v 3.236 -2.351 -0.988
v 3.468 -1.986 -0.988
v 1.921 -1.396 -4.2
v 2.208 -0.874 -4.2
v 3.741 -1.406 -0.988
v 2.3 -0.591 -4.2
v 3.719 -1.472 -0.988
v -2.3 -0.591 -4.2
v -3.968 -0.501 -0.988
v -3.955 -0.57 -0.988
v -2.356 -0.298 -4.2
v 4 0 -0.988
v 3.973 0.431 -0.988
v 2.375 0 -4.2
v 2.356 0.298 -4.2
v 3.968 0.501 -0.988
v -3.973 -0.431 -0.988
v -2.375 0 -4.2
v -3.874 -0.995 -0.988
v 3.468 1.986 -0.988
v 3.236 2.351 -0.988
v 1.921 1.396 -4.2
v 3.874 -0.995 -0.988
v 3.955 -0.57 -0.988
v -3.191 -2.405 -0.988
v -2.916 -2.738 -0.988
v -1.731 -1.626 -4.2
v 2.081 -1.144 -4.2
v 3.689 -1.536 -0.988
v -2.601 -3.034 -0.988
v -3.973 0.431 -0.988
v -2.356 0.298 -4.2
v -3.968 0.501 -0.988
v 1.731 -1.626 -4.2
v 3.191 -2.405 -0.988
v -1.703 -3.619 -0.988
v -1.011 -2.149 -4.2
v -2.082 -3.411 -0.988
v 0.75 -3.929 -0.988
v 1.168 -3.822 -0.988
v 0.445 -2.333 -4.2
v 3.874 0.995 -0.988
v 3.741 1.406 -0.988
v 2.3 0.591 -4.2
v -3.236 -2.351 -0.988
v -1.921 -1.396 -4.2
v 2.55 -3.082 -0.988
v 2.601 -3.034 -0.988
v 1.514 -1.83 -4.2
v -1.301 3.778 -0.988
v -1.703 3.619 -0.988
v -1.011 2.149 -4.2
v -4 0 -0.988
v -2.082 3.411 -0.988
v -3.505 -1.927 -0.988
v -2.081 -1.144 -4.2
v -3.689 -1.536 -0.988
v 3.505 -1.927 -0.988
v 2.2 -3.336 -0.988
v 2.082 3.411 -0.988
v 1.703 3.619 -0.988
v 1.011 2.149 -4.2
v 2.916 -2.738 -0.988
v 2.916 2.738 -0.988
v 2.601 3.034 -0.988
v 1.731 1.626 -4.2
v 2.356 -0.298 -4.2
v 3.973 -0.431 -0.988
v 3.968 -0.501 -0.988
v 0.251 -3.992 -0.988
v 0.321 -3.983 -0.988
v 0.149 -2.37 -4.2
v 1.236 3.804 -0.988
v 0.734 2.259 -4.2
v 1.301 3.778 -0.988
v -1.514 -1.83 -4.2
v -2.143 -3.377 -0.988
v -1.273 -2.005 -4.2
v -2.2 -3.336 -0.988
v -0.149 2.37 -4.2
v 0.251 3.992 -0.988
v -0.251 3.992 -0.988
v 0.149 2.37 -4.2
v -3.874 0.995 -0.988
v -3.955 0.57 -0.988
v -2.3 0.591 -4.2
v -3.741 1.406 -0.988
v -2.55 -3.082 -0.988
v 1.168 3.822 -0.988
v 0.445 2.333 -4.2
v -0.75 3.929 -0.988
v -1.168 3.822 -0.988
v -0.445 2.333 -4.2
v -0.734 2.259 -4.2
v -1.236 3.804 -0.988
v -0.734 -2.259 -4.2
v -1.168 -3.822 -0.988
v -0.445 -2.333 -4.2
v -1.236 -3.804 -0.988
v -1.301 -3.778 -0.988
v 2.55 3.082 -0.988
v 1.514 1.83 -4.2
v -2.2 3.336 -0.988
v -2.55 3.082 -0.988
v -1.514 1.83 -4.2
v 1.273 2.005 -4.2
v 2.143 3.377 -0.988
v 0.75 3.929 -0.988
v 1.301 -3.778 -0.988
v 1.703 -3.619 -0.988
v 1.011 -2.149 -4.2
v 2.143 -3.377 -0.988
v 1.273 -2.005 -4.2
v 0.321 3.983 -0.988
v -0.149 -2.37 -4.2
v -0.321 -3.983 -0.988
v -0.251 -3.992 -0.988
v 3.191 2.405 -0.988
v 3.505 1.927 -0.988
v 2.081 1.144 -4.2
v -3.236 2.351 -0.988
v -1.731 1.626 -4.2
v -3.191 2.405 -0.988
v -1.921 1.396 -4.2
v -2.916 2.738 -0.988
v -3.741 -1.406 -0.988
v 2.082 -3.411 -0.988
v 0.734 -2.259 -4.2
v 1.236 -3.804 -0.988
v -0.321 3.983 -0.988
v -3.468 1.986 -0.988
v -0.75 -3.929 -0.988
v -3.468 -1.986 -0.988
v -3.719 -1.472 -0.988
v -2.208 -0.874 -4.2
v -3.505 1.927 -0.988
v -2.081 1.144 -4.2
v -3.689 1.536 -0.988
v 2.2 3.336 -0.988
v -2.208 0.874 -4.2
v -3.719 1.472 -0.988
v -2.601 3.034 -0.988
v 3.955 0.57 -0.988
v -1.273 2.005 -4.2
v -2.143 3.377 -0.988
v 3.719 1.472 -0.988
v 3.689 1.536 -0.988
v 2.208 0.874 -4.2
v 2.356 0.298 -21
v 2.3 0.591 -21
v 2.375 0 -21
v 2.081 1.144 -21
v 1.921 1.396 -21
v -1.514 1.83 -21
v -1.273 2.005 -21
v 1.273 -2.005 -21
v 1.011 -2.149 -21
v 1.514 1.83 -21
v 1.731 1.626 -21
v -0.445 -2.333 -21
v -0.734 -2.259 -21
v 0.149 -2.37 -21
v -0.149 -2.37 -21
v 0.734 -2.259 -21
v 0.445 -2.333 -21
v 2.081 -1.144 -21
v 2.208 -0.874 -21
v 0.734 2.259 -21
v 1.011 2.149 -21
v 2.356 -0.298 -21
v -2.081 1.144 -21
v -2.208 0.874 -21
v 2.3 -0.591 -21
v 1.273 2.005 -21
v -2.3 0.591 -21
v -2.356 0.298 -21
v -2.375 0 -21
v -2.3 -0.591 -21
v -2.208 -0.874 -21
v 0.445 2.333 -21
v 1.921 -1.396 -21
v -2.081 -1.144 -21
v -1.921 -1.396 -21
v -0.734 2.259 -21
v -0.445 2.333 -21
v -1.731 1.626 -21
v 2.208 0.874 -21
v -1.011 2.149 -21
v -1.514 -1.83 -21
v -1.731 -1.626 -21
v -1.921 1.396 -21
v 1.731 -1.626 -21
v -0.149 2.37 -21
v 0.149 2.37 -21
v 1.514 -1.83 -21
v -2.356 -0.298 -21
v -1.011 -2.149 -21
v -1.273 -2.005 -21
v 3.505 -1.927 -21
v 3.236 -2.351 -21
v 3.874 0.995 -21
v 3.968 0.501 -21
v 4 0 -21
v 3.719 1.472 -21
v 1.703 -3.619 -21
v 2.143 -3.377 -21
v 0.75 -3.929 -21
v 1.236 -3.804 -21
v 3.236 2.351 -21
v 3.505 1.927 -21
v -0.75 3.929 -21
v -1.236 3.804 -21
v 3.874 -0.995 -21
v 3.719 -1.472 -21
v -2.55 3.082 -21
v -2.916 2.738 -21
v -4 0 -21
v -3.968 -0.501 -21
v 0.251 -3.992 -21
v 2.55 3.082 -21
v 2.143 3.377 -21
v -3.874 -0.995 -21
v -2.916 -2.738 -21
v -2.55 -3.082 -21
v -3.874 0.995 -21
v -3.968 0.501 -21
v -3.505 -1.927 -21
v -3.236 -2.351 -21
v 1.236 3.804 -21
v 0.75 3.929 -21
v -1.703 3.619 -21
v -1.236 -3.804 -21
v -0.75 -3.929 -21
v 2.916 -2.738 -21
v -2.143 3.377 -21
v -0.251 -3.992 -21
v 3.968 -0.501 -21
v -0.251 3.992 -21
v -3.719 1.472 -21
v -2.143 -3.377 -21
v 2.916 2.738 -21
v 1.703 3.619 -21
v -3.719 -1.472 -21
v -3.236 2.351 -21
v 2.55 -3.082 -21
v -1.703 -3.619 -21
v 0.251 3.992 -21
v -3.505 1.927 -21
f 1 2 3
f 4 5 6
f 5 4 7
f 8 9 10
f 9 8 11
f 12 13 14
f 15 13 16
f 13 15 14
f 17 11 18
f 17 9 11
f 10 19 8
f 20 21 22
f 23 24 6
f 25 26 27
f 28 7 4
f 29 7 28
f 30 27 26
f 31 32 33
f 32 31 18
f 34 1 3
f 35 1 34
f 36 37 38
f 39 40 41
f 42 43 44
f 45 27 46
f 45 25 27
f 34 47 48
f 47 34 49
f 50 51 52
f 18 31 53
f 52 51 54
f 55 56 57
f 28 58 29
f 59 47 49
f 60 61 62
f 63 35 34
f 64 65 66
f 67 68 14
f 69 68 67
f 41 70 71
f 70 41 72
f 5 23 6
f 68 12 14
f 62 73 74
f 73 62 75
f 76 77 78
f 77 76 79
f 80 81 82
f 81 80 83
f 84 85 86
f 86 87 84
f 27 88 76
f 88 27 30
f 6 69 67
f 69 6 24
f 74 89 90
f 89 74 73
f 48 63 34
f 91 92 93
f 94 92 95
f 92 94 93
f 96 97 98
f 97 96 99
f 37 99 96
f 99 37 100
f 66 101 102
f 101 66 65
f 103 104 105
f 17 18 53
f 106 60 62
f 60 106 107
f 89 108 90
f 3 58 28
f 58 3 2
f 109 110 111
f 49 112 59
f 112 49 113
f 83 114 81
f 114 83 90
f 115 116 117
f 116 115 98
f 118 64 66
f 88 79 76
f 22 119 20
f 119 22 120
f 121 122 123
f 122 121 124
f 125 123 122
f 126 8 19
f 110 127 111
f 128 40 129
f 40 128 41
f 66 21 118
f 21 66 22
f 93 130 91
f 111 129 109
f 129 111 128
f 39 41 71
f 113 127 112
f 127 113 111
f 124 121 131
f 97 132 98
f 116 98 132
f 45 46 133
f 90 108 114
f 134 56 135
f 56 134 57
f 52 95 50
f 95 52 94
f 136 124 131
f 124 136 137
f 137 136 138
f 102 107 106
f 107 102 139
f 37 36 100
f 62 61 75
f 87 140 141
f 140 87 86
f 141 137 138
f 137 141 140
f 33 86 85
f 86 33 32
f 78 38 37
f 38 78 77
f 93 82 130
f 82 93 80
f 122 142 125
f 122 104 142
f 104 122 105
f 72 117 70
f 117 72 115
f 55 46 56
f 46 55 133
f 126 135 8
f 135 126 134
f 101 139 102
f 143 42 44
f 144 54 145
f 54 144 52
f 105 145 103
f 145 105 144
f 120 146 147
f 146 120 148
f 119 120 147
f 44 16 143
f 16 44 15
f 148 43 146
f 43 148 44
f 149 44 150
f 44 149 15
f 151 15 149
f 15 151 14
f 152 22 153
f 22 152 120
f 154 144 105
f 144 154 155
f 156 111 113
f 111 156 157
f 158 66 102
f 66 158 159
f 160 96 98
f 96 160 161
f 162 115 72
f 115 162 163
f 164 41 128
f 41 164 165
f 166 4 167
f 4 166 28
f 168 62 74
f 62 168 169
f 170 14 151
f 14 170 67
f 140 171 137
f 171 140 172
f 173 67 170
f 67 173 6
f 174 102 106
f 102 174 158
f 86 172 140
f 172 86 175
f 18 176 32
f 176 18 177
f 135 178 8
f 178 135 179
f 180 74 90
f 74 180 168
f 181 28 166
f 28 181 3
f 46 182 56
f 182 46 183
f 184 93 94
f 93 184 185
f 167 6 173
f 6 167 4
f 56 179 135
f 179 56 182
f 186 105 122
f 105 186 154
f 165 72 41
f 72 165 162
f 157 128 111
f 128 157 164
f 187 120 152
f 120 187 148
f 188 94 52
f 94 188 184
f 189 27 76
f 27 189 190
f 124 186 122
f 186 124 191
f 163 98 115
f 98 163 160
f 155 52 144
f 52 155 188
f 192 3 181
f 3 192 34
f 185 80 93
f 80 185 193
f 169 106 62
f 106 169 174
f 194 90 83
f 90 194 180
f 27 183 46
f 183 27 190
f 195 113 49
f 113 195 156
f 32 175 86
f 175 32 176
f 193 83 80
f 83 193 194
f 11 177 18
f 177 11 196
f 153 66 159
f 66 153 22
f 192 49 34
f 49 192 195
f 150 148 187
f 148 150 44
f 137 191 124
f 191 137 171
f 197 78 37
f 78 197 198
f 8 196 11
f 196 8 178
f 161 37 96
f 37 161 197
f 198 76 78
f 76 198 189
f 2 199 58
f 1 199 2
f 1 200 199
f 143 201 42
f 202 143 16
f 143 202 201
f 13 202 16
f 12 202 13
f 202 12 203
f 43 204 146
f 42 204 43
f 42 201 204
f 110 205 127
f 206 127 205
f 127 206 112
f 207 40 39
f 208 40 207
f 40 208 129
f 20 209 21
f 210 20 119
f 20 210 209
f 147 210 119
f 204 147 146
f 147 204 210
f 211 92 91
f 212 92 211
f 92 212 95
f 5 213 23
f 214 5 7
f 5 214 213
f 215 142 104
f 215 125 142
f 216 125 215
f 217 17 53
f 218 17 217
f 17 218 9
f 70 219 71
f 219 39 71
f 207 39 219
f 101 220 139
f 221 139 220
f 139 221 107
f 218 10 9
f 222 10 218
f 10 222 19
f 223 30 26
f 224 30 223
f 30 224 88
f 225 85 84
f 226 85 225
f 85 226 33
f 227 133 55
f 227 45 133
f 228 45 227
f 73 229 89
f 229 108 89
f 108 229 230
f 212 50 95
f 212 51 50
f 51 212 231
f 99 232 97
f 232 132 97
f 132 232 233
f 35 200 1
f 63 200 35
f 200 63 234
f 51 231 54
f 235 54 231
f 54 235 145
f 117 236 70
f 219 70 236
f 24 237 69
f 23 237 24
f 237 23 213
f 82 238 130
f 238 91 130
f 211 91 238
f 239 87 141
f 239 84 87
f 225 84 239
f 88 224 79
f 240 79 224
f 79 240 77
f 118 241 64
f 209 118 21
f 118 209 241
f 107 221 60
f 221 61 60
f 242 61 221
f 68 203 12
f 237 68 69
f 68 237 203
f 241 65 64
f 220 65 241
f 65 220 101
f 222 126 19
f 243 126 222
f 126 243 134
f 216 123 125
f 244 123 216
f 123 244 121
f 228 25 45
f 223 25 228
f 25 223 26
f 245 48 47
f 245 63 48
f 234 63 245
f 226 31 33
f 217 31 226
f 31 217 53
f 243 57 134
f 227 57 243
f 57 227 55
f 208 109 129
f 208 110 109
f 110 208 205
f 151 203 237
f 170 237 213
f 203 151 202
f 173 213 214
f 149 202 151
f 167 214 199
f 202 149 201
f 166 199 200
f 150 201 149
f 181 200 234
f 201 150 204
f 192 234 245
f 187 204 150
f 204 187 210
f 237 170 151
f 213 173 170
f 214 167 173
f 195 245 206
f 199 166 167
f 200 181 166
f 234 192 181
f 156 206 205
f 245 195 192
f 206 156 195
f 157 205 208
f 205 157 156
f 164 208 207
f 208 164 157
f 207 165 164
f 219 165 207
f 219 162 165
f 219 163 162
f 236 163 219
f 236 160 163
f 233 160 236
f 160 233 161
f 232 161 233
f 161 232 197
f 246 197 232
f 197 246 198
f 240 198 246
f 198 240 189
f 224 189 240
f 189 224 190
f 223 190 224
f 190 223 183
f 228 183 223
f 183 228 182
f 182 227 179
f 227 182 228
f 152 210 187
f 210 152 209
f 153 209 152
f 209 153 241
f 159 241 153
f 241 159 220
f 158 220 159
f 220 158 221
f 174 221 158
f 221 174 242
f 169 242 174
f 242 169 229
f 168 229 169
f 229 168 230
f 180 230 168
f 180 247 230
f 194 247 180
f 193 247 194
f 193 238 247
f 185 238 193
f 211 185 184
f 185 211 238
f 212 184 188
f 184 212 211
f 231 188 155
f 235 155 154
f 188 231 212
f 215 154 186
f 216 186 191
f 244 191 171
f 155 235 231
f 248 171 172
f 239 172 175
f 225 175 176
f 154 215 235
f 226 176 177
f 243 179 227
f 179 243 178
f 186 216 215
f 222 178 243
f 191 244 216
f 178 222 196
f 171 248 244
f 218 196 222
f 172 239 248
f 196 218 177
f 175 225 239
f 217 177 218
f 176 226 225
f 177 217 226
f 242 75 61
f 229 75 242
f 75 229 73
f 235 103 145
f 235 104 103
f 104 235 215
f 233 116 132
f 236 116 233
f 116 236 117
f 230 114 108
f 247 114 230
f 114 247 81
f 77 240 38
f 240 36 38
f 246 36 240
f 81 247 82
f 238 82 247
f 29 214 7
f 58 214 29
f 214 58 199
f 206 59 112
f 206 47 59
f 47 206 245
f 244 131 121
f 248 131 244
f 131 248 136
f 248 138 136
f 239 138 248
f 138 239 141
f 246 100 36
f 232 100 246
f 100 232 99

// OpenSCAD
$fn = 50;

difference() {
	union() {
		translate(v = [0, 0, -21.0]) {
			cylinder(h = 21, r = 4.0);
		}
	}
	union() {
		translate(v = [0, 0, 0]) {
			rotate(a = [0, 0, 0]) {
				difference() {
					union() {
						translate(v = [0, 0, -24.0]) {
							cylinder(h = 24, r = 2.25);
						}
						translate(v = [0, 0, -4.2]) {
							cylinder(h = 4.2, r1 = 2.375, r2 = 4.5);
						}
						translate(v = [0, 0, -24.0]) {
							cylinder(h = 24, r = 2.375);
						}
						translate(v = [0, 0, -24.0]) {
							cylinder(h = 24, r = 2.25);
						}
					}
					union();
				}
			}
		}
	}
}
